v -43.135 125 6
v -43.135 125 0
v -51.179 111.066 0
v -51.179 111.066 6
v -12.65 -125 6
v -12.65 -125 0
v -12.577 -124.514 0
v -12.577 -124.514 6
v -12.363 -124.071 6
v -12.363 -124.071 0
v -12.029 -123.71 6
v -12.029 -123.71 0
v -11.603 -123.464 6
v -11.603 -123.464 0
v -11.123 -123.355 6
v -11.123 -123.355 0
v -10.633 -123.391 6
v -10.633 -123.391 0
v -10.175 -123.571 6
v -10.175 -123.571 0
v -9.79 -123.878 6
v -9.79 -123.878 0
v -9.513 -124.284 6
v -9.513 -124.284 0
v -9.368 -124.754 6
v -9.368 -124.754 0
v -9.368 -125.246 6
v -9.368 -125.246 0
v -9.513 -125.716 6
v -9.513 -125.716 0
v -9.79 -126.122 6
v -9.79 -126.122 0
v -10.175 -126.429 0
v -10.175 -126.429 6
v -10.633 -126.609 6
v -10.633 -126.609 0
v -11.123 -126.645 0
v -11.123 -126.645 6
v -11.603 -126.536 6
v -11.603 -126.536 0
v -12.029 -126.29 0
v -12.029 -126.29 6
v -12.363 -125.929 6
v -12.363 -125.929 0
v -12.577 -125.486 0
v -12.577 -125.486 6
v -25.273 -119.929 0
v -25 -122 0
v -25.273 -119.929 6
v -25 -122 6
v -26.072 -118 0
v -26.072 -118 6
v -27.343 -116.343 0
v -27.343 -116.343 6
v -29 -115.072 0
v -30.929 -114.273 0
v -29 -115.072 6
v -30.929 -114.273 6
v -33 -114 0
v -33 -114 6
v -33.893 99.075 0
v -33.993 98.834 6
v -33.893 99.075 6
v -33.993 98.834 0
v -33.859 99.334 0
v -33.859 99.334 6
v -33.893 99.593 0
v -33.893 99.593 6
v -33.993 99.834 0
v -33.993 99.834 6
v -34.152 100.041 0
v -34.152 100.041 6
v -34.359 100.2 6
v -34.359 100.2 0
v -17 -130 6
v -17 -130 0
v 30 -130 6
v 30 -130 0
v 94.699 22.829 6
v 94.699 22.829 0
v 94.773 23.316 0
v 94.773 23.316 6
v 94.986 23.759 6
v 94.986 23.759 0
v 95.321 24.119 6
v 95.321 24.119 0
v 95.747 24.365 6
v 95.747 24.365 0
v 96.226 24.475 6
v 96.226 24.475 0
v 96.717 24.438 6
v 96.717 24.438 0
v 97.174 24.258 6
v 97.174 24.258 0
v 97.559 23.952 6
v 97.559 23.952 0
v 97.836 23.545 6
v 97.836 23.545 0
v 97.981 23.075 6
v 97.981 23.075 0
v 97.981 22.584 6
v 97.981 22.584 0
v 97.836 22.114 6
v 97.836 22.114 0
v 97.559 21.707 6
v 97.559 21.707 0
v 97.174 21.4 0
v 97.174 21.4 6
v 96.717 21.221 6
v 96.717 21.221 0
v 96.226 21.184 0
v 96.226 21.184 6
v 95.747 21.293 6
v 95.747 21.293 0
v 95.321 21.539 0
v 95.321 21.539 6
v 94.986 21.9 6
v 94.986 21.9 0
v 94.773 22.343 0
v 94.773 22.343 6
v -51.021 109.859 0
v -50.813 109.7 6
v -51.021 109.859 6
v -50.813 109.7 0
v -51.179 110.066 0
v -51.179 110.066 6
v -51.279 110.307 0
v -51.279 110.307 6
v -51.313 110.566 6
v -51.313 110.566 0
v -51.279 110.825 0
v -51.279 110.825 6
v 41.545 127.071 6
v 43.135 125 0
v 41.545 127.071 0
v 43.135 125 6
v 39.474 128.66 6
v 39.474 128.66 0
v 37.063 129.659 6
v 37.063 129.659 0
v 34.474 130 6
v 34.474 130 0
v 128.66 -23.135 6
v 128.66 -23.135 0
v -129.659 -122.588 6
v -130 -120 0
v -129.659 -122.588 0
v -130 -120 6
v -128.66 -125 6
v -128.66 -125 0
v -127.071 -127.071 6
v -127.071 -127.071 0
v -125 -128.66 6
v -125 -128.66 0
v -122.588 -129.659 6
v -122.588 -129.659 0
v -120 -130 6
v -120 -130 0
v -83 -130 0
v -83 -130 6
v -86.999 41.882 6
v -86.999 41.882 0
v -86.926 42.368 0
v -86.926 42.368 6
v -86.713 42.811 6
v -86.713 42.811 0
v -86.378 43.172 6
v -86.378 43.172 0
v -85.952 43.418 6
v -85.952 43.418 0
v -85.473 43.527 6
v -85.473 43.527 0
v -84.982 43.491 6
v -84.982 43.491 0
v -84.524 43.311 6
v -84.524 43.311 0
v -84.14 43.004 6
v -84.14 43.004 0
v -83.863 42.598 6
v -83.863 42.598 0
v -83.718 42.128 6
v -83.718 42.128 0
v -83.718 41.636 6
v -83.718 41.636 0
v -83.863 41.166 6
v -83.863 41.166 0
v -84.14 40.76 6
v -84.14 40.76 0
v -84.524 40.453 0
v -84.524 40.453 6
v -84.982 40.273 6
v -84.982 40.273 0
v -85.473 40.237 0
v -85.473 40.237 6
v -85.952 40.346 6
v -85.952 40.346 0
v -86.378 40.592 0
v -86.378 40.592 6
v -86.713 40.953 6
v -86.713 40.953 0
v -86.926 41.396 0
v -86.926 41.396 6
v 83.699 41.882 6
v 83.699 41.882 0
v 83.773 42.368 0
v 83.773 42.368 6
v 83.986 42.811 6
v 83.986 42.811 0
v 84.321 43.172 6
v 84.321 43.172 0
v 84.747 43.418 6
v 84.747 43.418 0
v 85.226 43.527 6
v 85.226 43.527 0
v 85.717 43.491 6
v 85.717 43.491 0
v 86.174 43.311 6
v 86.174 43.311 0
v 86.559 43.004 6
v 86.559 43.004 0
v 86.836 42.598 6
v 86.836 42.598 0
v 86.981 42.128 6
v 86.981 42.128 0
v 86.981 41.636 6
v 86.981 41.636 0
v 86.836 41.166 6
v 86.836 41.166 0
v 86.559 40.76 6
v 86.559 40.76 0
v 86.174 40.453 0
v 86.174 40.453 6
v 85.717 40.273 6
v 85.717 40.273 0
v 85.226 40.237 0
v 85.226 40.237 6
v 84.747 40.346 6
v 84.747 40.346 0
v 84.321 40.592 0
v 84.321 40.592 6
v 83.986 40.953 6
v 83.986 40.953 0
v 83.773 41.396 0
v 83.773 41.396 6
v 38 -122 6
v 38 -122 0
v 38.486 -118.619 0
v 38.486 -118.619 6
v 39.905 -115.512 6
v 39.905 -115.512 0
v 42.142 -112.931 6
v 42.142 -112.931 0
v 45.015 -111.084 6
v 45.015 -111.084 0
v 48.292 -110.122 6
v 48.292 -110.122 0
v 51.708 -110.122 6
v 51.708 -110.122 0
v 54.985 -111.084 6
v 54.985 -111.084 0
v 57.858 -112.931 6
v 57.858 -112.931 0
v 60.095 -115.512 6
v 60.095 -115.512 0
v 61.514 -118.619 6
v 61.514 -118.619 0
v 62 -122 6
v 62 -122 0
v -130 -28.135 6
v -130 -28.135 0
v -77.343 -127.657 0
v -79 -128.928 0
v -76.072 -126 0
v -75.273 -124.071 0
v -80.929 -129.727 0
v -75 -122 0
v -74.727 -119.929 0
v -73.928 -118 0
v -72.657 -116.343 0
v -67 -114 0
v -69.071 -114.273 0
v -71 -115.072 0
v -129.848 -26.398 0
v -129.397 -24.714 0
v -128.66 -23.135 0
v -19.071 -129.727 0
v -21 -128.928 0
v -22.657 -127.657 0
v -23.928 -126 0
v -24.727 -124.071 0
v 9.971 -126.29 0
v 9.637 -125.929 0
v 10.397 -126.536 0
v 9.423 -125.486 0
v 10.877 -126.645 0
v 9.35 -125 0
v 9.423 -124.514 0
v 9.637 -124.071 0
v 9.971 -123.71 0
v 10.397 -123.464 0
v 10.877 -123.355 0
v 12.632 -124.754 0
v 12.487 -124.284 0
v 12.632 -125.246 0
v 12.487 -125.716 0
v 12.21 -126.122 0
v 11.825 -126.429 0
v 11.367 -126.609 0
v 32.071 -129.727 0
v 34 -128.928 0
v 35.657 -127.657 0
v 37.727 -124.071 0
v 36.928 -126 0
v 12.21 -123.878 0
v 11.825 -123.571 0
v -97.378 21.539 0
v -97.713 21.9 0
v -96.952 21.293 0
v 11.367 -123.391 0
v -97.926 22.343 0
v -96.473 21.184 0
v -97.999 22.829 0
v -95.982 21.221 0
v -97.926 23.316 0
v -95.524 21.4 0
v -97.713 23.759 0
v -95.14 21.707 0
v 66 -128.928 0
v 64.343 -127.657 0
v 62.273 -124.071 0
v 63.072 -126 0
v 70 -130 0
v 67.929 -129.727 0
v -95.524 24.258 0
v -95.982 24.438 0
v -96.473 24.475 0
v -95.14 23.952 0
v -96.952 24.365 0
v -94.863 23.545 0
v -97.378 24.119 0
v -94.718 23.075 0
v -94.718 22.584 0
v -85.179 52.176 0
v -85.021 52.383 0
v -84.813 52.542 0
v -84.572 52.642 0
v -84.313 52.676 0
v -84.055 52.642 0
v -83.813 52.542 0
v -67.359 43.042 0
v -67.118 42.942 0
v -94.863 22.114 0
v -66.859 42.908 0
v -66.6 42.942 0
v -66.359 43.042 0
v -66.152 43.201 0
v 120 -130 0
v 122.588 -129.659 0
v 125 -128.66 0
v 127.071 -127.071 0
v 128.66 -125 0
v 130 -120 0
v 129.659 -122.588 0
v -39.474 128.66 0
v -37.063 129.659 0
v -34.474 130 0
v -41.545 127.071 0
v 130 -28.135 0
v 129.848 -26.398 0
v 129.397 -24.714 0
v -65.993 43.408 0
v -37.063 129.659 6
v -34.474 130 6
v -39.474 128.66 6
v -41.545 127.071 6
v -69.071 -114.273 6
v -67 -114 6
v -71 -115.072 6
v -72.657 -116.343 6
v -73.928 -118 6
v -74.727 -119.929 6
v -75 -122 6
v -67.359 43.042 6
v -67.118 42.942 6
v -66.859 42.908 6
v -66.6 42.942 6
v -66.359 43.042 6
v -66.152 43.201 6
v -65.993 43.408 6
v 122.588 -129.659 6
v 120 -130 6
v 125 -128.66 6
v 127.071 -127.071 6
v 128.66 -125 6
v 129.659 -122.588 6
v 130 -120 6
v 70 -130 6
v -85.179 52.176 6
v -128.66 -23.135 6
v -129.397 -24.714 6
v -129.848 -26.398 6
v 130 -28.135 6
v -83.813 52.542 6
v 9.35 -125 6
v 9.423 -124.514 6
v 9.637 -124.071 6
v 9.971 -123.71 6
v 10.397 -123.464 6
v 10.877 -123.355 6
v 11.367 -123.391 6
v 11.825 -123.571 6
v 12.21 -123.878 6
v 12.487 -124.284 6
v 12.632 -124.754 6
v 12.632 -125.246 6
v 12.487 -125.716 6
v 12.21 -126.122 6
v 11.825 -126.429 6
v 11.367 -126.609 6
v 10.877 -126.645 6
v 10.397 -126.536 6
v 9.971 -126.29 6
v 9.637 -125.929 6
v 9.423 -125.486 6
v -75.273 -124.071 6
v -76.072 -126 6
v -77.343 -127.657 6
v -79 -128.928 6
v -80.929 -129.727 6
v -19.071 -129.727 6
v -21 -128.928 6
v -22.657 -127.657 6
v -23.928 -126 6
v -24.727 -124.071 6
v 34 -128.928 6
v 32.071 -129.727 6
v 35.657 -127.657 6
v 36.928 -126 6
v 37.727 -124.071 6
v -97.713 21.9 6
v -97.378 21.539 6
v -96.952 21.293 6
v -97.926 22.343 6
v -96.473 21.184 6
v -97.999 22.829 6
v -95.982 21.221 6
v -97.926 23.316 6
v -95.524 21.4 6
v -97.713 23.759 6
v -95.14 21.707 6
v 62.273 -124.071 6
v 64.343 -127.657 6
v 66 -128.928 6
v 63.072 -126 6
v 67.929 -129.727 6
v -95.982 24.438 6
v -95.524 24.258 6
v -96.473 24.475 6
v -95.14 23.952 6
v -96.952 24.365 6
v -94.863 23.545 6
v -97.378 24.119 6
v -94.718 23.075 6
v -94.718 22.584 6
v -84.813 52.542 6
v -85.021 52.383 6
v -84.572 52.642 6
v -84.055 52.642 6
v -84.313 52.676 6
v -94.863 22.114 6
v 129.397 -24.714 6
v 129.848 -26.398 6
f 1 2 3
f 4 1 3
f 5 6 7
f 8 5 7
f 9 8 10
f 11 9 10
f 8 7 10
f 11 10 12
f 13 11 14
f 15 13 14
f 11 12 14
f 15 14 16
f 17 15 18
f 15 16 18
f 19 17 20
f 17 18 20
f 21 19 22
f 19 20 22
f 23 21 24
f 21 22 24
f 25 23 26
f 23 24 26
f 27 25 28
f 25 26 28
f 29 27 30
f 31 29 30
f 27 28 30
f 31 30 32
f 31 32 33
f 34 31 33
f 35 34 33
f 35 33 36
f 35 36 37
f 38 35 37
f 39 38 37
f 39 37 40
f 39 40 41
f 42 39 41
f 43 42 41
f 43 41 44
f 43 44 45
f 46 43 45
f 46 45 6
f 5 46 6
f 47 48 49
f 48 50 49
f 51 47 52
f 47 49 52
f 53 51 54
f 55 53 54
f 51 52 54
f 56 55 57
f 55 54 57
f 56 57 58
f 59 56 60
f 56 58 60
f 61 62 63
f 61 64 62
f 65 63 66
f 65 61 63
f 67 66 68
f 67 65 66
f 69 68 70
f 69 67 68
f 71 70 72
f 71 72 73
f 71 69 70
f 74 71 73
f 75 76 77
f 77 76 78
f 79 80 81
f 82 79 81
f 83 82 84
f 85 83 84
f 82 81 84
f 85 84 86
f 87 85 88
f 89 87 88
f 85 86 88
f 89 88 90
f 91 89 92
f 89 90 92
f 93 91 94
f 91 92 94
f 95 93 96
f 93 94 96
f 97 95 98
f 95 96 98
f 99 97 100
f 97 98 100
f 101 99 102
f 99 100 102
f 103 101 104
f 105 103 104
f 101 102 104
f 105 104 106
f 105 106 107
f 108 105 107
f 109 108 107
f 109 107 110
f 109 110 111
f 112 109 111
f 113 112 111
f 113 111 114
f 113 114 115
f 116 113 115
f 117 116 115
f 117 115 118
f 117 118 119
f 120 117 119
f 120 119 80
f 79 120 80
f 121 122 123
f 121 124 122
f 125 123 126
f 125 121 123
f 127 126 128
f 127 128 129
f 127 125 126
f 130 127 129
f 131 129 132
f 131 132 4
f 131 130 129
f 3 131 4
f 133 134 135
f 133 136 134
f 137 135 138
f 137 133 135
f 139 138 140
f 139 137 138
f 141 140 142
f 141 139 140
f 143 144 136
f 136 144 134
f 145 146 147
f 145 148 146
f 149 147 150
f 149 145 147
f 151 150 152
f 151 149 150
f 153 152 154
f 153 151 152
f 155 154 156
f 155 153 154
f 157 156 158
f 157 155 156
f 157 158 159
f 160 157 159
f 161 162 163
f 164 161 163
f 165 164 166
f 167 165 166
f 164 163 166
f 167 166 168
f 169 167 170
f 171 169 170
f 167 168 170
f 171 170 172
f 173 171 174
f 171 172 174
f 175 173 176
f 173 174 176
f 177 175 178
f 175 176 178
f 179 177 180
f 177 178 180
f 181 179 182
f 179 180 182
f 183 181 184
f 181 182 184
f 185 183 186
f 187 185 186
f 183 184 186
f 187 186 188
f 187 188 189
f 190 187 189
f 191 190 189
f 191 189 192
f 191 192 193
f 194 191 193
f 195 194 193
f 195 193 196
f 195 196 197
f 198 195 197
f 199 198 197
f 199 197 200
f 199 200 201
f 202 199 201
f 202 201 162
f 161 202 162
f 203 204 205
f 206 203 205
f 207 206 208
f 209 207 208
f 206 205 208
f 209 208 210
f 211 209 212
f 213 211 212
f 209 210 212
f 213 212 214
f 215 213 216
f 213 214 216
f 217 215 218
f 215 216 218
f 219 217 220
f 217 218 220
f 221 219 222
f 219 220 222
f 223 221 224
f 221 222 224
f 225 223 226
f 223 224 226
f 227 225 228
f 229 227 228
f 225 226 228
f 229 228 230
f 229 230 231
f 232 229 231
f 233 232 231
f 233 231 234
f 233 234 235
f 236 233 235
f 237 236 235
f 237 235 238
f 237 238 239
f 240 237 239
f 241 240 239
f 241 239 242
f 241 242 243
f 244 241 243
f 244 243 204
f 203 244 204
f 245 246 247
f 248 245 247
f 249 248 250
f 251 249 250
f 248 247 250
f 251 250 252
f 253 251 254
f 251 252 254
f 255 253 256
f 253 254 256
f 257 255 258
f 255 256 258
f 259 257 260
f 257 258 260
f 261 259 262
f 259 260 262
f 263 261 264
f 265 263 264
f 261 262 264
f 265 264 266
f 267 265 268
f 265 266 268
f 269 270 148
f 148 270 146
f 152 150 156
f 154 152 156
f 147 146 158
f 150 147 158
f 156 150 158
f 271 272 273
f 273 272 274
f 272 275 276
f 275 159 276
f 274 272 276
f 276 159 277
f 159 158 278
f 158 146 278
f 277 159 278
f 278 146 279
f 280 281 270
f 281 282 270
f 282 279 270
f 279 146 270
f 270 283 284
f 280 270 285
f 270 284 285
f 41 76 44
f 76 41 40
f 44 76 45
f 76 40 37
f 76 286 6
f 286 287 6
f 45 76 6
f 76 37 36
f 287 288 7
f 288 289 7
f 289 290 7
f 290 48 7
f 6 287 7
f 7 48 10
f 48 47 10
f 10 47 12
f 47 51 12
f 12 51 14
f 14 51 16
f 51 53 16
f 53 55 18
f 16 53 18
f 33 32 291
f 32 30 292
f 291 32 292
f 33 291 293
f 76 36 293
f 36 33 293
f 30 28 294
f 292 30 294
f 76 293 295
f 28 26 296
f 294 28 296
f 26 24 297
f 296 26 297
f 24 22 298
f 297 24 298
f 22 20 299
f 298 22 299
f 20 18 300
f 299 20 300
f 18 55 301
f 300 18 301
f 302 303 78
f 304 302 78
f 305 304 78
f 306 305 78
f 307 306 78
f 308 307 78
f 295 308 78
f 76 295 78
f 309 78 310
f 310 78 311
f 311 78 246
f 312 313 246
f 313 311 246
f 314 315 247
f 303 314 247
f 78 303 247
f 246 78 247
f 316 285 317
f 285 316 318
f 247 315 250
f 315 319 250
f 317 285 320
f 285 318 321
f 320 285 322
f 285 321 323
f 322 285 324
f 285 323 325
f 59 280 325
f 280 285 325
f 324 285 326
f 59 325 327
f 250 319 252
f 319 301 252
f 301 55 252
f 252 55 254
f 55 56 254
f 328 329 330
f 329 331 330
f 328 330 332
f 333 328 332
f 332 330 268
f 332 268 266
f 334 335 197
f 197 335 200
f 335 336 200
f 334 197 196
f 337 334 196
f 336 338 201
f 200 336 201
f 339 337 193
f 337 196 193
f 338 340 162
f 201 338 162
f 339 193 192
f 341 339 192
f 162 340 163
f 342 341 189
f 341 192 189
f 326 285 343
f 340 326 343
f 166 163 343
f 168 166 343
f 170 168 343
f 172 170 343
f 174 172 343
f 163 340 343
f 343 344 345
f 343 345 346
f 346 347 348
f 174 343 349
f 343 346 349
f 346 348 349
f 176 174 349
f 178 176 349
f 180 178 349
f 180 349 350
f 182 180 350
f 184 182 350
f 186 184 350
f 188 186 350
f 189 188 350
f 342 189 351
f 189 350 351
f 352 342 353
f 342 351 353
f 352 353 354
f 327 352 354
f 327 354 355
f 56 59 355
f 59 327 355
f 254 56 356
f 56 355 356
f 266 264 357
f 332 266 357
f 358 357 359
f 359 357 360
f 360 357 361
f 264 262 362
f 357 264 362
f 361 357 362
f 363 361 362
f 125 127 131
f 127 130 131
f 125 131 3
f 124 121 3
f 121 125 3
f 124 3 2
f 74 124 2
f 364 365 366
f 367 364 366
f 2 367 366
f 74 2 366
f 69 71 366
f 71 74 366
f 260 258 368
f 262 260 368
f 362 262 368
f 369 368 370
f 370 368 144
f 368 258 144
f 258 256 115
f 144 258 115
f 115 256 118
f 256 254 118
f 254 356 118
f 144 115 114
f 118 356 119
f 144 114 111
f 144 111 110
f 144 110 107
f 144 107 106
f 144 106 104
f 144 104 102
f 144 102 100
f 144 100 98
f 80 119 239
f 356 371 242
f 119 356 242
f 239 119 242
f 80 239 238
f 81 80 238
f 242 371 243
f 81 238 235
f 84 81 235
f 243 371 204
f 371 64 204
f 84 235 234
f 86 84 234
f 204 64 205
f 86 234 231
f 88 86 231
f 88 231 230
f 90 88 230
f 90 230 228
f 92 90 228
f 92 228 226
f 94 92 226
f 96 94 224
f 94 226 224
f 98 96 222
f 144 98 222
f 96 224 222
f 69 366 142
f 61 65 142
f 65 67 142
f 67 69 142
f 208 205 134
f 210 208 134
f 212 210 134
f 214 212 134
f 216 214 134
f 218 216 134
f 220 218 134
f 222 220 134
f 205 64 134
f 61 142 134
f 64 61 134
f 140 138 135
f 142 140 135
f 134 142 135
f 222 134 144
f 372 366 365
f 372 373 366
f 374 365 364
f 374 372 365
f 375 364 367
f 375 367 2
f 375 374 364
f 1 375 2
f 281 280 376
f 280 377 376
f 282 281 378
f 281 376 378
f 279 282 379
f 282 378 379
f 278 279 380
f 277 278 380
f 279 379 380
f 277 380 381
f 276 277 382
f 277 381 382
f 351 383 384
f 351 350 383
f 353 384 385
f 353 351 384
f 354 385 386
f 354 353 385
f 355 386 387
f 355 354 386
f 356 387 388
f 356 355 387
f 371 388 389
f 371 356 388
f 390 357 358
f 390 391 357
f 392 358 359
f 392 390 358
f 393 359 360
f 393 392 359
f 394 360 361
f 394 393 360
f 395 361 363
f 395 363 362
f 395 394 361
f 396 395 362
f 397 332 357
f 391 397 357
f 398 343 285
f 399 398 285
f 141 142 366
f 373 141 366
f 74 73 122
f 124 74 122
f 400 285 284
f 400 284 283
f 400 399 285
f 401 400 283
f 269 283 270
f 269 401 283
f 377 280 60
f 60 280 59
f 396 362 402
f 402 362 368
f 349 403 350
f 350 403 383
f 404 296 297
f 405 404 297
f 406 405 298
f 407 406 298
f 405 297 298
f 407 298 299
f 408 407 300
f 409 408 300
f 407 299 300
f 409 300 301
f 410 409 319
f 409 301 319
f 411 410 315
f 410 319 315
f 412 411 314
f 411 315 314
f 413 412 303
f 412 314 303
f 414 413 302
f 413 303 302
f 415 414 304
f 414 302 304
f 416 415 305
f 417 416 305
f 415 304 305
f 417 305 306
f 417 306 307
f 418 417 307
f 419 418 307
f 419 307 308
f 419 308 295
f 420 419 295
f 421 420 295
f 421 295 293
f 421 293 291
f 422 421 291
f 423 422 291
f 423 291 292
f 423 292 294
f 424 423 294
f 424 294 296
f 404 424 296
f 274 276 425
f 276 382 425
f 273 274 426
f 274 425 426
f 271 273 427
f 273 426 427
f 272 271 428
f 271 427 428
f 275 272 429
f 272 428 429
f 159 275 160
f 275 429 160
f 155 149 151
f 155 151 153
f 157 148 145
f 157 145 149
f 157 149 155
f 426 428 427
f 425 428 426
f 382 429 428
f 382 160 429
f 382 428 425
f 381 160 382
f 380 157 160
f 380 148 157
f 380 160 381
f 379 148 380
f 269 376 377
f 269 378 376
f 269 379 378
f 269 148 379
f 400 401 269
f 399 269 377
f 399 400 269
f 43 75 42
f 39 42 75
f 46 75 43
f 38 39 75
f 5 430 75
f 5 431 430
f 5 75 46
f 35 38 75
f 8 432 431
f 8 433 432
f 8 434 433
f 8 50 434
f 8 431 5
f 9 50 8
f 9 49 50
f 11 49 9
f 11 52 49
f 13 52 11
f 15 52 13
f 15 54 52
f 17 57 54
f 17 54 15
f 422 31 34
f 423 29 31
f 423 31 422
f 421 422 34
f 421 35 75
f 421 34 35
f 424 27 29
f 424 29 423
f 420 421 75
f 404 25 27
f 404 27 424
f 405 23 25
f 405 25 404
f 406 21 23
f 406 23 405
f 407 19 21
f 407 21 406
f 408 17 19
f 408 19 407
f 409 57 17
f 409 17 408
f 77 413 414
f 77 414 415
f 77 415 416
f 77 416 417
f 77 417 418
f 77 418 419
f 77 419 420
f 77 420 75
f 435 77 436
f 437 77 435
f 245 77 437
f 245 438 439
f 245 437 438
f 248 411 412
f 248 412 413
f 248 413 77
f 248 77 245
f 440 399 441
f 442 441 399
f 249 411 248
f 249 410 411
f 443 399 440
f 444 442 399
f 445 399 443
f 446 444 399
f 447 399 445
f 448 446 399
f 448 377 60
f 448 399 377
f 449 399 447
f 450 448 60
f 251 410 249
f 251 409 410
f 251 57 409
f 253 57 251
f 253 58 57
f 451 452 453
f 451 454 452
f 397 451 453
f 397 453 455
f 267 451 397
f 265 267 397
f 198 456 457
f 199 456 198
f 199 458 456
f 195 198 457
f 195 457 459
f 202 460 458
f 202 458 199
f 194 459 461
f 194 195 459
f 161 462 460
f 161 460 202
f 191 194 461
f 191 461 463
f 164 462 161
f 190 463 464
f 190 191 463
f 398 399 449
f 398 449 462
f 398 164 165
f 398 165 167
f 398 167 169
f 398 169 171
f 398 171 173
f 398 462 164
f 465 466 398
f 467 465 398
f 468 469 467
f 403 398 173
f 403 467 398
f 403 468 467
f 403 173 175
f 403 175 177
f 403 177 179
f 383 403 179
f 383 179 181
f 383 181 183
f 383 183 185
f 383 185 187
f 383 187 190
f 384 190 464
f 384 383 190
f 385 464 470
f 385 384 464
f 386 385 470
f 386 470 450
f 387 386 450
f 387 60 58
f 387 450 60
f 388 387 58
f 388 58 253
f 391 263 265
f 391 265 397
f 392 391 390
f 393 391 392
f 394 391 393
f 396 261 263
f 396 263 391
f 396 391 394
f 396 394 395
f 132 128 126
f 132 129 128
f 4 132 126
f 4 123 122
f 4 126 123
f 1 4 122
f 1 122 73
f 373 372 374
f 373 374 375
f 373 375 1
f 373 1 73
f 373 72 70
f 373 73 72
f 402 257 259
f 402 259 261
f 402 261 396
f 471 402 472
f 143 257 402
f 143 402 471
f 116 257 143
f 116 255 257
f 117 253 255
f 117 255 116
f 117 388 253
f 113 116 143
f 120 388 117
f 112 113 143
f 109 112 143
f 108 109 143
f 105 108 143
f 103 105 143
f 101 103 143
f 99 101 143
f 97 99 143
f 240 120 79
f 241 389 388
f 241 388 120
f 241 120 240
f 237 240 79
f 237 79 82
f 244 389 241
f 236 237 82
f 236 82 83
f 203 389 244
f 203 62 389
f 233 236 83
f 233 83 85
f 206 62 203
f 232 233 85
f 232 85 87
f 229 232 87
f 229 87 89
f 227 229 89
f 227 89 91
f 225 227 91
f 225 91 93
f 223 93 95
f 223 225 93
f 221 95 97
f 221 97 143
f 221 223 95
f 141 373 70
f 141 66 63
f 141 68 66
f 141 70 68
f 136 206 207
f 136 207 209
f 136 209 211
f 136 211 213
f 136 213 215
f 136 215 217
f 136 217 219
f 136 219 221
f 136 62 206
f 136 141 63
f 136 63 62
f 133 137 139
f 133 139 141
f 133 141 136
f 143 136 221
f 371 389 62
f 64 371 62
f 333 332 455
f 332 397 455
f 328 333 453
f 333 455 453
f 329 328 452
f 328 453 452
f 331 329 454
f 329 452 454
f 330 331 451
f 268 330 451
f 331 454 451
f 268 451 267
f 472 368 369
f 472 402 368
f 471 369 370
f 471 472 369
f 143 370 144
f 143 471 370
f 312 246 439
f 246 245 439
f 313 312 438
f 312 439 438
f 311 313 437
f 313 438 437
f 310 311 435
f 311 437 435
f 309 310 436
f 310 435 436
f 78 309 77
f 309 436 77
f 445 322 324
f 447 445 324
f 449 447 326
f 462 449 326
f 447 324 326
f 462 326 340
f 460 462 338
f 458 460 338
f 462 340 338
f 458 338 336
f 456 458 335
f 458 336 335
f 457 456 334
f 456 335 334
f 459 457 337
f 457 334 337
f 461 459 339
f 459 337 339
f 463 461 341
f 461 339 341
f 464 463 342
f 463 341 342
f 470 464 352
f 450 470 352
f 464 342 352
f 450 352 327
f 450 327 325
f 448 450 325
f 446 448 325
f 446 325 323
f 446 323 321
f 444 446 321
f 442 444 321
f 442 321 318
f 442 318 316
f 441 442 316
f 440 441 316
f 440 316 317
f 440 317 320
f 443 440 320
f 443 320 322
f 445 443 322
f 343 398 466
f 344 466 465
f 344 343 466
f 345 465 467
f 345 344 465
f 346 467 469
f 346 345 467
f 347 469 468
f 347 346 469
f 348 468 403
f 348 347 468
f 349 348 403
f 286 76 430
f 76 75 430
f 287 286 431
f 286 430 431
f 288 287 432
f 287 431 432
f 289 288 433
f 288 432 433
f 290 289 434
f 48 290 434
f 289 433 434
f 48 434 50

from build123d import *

# Parameters (mm, degrees)
F1_DEPTH = 6
F2_R     = 10
F3_R     = 7.99999
F5_D     = 3.3
F6_DEPTH = 6.001
F7_R     = 1


# Not quite as in the source:
# - a fillet or chamfer is up to 0.001 mm smaller than in the source, because OpenCascade refuses the exact size


with BuildPart() as f1:
    # F0 (on Top) → F1 (new body)
    with BuildSketch(Plane.XY):
        with BuildLine():
            Line((62, -130), (130, -130))
            Line((130, -130), (130, -25.455173281))
            Line((130, -25.455173281), (40.2479138593, 130))
            Line((40.2479138593, 130), (-40.2479138593, 130))
            Line((-40.2479138593, 130), (-130, -25.455173281))
            Line((-130, -25.455173281), (-130, -130))
            Line((-130, -130), (-75, -130))
            Line((-75, -130), (-75, -114))
            Line((-75, -114), (-25, -114))
            Line((-25, -114), (-25, -130))
            Line((-25, -130), (38, -130))
            Line((38, -130), (38, -122))
            ThreePointArc((38, -122), (50, -110), (62, -122))
            Line((62, -122), (62, -130))
        make_face()
    extrude(amount=F1_DEPTH)

    # F2
    f2_edges = [f1.edges().sort_by_distance(p)[0] for p in [
        (130, -25.455173, 3),
        (40.247914, 130, 3),
        (-40.247914, 130, 3),
        (-130, -25.455173, 3),
        (130, -130, 3),
        (-130, -130, 3),
    ]]
    fillet(f2_edges, radius=F2_R)

    # F3 (radius 8 in the source; OpenCascade refuses exactly that, so slightly less here)
    f3_edges = [f1.edges().sort_by_distance(p)[0] for p in [
        (-75, -130, 3),
        (-75, -114, 3),
        (-25, -114, 3),
        (-25, -130, 3),
        (38, -130, 3),
        (62, -130, 3),
    ]]
    fillet(f3_edges, radius=F3_R)

    # F5 (through all)
    with Locations(Plane.XY.offset(6)):
        with Locations((11, -125), (-11, -125), (-96.3493649054, 22.8294364099), (-85.3493649054, 41.8819952931), (96.3493649054, 22.8294364099), (85.3493649054, 41.8819952931)):
            Hole(F5_D / 2)

    # F4 (on face) → F6 (cut, through all)
    with BuildSketch(Plane.XY.offset(6)):
        Polygon((-51.6794919243, 110.1999259807), (-84.6794919243, 53.042249331), (-66.4929584448, 42.542249331), (-33.4929584448, 99.6999259807), align=None)
    extrude(amount=-F6_DEPTH, mode=Mode.SUBTRACT)

    # F7
    f7_edges = [f1.edges().sort_by_distance(p)[0] for p in [
        (-33.492958, 99.699926, 3),
        (-66.492958, 42.542249, 3),
        (-51.679492, 110.199926, 3),
        (-84.679492, 53.042249, 3),
    ]]
    fillet(f7_edges, radius=F7_R)


solid = f1.part
